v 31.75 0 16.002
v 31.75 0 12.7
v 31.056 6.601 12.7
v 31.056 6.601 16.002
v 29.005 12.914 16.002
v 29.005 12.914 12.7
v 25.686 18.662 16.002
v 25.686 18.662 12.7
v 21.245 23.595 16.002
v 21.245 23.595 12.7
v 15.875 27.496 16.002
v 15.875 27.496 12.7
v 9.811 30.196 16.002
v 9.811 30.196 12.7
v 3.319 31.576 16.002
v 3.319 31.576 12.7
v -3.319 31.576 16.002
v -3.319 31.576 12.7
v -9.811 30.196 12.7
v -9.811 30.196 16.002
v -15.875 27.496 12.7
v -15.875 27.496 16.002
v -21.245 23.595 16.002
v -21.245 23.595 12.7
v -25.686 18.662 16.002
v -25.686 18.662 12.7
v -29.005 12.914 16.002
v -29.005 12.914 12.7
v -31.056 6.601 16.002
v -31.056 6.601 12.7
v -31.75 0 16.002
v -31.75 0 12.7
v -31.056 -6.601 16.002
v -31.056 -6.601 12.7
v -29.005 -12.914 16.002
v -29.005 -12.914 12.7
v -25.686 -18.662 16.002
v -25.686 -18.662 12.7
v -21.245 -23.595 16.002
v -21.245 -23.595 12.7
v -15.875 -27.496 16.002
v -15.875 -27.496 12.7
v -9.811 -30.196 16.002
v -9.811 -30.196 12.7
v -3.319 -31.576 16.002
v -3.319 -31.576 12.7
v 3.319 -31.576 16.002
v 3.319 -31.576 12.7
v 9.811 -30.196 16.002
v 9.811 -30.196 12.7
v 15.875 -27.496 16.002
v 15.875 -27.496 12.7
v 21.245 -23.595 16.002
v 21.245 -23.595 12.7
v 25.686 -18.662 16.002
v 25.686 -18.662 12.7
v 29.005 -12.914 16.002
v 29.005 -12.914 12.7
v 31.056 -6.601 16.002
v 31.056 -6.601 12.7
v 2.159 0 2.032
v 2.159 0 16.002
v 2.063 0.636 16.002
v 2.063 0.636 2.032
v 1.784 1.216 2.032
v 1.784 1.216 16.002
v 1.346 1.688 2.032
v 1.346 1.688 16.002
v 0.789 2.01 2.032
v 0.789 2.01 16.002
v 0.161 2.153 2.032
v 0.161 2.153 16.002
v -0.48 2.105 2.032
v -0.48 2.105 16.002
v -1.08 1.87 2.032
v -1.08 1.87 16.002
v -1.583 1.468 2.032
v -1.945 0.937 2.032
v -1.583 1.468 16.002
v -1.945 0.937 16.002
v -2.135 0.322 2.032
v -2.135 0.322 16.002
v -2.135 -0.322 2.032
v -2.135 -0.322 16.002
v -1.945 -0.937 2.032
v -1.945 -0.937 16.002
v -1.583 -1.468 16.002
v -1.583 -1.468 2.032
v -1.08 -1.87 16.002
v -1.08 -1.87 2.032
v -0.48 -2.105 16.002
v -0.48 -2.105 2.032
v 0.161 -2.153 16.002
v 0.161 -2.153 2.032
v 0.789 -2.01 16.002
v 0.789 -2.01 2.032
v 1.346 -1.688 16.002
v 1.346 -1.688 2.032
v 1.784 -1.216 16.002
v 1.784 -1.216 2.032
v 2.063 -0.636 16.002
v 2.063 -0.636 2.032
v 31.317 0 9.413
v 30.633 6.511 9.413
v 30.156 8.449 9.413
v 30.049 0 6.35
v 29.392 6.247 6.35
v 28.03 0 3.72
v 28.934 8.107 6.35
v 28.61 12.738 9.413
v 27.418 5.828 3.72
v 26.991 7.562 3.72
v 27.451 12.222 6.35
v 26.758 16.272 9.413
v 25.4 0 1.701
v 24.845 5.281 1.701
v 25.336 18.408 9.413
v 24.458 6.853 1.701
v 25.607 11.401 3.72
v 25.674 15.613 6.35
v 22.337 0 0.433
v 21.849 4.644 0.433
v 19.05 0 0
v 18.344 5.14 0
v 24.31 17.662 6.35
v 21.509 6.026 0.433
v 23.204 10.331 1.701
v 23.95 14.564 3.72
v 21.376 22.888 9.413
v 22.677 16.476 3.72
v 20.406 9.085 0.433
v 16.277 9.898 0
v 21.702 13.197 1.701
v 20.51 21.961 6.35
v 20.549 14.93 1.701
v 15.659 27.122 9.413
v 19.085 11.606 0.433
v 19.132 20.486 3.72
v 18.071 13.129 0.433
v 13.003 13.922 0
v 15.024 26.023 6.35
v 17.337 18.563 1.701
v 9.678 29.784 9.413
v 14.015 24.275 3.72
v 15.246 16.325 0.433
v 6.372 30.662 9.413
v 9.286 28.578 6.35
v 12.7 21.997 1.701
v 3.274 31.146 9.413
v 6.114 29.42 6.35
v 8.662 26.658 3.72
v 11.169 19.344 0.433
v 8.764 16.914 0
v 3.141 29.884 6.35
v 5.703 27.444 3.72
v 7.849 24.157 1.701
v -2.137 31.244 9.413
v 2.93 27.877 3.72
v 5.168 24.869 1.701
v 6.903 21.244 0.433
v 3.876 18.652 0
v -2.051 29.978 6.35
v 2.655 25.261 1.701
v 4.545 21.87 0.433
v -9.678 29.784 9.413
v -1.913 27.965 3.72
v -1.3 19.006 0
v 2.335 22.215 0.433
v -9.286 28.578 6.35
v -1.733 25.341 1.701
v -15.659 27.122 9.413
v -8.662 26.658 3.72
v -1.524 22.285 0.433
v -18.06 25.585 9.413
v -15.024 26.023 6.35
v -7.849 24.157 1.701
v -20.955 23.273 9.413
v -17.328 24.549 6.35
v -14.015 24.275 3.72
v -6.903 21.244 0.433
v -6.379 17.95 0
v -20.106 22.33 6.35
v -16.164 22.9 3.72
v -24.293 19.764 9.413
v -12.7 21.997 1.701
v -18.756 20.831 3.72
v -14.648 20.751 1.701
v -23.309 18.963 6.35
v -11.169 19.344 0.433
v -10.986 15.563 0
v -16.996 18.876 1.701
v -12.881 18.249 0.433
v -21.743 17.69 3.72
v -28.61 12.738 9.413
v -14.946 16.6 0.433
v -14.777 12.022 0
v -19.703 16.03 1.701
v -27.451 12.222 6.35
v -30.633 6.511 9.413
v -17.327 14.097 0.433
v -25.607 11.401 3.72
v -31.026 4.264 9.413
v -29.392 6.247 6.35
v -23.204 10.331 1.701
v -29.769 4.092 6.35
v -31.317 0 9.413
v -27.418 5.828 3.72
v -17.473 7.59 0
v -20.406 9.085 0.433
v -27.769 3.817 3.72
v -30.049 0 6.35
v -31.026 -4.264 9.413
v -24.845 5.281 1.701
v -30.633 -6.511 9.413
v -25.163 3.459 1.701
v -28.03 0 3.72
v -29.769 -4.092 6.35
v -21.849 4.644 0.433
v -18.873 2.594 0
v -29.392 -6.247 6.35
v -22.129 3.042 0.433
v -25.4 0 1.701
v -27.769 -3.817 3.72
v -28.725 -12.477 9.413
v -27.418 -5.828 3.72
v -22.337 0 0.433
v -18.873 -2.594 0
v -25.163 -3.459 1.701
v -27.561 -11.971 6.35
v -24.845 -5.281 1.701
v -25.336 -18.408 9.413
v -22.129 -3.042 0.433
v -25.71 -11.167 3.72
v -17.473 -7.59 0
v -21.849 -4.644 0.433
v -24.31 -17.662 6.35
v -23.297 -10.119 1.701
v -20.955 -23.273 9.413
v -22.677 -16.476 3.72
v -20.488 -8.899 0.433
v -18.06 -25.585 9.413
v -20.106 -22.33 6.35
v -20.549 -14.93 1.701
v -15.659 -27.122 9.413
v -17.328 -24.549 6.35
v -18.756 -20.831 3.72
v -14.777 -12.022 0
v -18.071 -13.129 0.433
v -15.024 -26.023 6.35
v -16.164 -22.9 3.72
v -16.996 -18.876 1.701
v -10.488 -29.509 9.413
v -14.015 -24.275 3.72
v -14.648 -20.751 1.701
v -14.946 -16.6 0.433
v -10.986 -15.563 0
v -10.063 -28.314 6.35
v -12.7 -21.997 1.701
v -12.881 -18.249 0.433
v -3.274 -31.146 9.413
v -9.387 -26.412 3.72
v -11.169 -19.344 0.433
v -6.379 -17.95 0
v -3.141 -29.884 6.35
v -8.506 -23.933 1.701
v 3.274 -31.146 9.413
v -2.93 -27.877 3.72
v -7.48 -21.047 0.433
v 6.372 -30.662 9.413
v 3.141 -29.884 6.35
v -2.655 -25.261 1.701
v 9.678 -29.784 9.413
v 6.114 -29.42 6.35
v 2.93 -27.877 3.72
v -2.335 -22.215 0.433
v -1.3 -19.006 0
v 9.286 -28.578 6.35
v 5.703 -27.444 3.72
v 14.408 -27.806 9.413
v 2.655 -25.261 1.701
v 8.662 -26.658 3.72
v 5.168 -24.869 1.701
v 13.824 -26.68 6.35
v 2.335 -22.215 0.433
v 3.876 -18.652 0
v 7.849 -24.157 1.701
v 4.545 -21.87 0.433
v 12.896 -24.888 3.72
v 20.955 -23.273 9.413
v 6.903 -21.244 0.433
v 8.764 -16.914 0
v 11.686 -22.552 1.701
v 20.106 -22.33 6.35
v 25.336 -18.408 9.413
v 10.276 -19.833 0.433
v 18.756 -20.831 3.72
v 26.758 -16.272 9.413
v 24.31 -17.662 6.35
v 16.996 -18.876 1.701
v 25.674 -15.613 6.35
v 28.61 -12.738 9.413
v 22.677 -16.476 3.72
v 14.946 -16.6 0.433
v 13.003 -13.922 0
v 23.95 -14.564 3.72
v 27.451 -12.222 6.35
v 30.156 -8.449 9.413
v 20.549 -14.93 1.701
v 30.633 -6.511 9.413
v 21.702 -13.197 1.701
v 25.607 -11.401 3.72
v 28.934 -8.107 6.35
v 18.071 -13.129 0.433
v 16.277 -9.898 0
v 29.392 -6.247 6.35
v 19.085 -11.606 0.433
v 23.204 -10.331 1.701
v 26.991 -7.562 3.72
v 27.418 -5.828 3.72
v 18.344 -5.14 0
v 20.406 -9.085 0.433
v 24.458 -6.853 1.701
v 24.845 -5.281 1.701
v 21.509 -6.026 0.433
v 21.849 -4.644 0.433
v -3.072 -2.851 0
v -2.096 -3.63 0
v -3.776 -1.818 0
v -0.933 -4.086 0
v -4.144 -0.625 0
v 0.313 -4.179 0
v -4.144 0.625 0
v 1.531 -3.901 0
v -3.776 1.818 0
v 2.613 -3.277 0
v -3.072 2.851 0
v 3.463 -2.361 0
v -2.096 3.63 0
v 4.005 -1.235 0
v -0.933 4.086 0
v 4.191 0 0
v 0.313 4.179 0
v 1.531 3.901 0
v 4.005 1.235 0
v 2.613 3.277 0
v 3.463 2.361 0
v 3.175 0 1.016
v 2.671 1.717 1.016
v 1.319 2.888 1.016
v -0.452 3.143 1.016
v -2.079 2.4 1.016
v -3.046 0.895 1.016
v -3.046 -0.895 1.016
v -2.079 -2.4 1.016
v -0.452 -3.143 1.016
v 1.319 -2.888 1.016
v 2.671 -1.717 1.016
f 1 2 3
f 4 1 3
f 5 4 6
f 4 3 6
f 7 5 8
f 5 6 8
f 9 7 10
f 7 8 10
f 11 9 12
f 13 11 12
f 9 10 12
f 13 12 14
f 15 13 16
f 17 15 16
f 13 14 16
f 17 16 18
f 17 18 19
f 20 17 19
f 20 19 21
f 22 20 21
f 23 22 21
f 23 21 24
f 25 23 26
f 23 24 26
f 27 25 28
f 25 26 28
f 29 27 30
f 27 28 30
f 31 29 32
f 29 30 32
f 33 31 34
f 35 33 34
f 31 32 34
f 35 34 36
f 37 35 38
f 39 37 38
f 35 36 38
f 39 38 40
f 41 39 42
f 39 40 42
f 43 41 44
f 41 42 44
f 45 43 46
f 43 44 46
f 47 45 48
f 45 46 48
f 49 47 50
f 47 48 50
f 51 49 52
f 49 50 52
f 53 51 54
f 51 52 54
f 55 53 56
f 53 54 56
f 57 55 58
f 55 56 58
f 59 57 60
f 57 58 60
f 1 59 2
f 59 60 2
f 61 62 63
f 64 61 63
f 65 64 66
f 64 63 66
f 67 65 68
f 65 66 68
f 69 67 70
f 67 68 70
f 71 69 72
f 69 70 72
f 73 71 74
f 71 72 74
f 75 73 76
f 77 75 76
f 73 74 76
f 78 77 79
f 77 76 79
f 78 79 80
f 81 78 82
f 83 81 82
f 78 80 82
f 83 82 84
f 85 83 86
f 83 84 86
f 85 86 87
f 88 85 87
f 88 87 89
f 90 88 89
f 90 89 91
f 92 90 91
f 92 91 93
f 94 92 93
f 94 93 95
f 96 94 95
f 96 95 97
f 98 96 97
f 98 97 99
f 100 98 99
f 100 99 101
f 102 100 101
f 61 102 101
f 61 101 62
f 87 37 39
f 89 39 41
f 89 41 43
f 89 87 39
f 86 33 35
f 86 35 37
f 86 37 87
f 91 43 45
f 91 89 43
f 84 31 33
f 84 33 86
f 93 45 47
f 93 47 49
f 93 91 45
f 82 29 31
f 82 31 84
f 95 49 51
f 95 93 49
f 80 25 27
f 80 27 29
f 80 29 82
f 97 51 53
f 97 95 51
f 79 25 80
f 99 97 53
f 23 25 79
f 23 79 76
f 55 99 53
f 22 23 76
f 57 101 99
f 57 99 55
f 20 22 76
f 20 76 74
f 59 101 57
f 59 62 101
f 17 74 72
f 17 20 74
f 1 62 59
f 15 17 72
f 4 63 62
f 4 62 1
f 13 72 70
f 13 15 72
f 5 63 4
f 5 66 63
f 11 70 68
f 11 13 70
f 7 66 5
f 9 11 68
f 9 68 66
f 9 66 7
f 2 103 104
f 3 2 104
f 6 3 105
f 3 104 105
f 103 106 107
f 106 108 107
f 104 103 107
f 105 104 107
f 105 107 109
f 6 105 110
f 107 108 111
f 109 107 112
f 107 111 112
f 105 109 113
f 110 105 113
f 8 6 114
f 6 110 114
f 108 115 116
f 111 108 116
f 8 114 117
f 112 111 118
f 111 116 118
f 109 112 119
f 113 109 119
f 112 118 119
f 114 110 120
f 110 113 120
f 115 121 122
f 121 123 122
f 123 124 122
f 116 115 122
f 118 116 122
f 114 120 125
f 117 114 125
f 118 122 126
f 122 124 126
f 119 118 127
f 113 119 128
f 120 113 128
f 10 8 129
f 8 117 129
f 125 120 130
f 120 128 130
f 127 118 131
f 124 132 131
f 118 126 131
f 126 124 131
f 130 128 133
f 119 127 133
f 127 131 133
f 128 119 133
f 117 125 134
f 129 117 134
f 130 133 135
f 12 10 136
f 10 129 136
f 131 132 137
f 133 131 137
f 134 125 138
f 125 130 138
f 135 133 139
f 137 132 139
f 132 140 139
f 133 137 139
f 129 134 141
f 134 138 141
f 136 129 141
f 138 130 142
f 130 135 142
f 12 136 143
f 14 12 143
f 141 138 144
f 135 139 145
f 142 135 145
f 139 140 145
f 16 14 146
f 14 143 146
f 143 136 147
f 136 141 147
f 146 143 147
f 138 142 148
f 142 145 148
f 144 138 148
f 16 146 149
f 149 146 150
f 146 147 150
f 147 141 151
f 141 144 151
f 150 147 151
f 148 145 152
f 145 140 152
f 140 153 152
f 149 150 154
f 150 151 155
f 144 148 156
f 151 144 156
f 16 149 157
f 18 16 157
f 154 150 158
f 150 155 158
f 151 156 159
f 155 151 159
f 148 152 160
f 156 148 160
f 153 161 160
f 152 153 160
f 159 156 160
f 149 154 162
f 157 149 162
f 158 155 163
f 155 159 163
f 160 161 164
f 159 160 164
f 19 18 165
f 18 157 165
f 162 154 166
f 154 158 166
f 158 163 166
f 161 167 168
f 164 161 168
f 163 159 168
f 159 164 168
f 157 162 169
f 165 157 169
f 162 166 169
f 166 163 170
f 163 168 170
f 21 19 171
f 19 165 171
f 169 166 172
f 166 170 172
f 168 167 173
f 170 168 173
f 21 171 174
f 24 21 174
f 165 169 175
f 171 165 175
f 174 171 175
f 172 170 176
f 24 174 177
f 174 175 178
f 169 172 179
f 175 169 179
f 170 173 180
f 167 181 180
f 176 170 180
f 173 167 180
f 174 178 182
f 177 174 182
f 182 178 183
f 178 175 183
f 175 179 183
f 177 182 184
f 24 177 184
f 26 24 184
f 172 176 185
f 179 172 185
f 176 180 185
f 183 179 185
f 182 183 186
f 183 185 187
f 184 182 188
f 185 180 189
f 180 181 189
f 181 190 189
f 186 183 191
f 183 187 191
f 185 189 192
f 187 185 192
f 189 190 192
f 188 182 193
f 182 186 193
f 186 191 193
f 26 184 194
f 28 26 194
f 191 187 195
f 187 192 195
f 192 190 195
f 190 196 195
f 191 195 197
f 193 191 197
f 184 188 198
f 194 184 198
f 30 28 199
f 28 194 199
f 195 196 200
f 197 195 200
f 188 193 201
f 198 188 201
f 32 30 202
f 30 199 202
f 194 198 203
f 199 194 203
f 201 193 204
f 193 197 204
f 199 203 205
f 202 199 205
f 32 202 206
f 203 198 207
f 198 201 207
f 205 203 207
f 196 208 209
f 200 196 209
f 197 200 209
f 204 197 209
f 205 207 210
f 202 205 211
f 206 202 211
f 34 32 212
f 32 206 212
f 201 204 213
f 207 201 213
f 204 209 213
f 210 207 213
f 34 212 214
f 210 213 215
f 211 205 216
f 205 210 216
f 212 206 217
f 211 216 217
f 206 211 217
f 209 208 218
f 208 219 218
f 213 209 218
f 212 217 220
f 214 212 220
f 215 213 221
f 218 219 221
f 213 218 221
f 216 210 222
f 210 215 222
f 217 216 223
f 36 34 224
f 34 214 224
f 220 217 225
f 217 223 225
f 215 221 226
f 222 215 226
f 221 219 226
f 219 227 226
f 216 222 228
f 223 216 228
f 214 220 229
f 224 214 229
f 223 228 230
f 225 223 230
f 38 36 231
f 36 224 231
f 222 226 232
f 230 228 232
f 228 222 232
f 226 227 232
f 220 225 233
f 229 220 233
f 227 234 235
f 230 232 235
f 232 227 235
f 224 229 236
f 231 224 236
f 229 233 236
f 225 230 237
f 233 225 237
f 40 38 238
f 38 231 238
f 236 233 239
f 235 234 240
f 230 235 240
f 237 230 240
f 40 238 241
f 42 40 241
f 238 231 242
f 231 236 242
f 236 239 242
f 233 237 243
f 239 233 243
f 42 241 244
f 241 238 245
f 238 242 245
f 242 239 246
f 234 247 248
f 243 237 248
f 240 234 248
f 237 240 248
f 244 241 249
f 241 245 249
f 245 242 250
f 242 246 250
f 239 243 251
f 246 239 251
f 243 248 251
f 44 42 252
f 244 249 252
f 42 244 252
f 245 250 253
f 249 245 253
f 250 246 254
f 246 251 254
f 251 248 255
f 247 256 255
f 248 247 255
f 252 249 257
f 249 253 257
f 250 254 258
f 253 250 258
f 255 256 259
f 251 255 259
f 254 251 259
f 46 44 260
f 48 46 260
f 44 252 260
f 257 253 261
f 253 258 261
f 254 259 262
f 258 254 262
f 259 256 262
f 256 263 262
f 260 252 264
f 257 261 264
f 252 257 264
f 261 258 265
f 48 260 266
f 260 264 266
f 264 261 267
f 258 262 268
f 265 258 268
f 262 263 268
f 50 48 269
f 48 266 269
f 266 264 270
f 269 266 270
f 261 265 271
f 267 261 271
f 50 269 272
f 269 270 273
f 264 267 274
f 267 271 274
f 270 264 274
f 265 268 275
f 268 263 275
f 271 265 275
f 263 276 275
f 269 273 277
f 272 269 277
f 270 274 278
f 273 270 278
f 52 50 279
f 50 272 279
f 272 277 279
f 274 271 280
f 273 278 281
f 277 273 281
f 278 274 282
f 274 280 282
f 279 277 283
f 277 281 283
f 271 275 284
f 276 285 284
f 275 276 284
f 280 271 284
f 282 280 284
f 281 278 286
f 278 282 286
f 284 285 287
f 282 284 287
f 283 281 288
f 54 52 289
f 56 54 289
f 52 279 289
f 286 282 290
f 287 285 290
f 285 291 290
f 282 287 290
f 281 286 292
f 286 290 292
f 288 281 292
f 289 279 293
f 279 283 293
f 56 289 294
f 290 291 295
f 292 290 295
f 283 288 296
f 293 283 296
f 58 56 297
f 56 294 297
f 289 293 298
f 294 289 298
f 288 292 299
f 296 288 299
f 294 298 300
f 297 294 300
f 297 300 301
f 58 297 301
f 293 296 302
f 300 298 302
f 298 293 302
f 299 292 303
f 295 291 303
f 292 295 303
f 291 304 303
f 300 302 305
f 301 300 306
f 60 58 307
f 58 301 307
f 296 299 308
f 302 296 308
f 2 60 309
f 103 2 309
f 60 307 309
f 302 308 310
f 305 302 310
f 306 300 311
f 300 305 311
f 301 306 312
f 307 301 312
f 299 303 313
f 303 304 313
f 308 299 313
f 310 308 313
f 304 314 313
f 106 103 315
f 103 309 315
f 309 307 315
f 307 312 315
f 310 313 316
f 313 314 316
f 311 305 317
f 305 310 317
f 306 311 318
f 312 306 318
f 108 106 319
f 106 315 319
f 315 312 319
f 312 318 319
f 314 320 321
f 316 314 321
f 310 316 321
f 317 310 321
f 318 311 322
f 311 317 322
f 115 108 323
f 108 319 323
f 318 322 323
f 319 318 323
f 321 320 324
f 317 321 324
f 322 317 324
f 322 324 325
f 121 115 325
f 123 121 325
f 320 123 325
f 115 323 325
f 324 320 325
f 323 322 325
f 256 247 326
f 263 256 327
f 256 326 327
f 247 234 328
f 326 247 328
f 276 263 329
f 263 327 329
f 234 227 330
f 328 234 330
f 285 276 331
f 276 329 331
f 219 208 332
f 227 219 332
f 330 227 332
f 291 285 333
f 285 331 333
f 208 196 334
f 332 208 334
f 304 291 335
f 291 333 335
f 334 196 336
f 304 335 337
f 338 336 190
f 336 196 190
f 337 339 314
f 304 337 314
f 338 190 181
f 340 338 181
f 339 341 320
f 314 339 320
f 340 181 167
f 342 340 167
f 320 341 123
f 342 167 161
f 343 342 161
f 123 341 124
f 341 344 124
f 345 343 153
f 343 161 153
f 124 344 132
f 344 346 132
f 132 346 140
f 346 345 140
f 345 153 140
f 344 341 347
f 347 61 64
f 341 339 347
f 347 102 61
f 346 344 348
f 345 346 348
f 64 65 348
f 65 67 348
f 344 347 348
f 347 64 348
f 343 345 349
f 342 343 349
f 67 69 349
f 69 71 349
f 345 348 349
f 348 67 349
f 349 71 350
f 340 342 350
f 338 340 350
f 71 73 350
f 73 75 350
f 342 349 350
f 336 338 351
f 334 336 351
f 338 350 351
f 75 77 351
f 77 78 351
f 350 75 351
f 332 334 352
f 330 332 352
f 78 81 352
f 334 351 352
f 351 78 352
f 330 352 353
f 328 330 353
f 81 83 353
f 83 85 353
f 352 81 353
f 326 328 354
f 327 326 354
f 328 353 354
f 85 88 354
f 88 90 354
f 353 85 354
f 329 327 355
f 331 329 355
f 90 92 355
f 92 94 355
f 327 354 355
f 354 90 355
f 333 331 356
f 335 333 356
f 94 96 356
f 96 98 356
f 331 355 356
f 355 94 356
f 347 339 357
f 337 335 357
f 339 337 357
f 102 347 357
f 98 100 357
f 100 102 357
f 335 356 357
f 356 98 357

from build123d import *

# Parameters (mm, degrees)
F0_R     = 31.75
F1_DEPTH = 16.002
F2_R     = 12.7
F3_R     = 2.159
F4_DEPTH = 16.003
F5_SIZE  = 2.032


with BuildPart() as f1:
    # F0 (on Top) → F1 (new body)
    with BuildSketch(Plane.XY):
        Circle(F0_R)
    extrude(amount=F1_DEPTH)

    # F2
    f2_edges = [f1.edges().sort_by_distance(p)[0] for p in [
        (-31.75, 0, 0),
    ]]
    fillet(f2_edges, radius=F2_R)

    # F3 (on face) → F4 (cut, through all)
    with BuildSketch(Plane.XY.offset(16.002)):
        Circle(F3_R)
    extrude(amount=-F4_DEPTH, mode=Mode.SUBTRACT)

    # F5
    f5_edges = [f1.edges().sort_by_distance(p)[0] for p in [
        (-2.159, 0, 0),
    ]]
    chamfer(f5_edges, length=F5_SIZE)


solid = f1.part
